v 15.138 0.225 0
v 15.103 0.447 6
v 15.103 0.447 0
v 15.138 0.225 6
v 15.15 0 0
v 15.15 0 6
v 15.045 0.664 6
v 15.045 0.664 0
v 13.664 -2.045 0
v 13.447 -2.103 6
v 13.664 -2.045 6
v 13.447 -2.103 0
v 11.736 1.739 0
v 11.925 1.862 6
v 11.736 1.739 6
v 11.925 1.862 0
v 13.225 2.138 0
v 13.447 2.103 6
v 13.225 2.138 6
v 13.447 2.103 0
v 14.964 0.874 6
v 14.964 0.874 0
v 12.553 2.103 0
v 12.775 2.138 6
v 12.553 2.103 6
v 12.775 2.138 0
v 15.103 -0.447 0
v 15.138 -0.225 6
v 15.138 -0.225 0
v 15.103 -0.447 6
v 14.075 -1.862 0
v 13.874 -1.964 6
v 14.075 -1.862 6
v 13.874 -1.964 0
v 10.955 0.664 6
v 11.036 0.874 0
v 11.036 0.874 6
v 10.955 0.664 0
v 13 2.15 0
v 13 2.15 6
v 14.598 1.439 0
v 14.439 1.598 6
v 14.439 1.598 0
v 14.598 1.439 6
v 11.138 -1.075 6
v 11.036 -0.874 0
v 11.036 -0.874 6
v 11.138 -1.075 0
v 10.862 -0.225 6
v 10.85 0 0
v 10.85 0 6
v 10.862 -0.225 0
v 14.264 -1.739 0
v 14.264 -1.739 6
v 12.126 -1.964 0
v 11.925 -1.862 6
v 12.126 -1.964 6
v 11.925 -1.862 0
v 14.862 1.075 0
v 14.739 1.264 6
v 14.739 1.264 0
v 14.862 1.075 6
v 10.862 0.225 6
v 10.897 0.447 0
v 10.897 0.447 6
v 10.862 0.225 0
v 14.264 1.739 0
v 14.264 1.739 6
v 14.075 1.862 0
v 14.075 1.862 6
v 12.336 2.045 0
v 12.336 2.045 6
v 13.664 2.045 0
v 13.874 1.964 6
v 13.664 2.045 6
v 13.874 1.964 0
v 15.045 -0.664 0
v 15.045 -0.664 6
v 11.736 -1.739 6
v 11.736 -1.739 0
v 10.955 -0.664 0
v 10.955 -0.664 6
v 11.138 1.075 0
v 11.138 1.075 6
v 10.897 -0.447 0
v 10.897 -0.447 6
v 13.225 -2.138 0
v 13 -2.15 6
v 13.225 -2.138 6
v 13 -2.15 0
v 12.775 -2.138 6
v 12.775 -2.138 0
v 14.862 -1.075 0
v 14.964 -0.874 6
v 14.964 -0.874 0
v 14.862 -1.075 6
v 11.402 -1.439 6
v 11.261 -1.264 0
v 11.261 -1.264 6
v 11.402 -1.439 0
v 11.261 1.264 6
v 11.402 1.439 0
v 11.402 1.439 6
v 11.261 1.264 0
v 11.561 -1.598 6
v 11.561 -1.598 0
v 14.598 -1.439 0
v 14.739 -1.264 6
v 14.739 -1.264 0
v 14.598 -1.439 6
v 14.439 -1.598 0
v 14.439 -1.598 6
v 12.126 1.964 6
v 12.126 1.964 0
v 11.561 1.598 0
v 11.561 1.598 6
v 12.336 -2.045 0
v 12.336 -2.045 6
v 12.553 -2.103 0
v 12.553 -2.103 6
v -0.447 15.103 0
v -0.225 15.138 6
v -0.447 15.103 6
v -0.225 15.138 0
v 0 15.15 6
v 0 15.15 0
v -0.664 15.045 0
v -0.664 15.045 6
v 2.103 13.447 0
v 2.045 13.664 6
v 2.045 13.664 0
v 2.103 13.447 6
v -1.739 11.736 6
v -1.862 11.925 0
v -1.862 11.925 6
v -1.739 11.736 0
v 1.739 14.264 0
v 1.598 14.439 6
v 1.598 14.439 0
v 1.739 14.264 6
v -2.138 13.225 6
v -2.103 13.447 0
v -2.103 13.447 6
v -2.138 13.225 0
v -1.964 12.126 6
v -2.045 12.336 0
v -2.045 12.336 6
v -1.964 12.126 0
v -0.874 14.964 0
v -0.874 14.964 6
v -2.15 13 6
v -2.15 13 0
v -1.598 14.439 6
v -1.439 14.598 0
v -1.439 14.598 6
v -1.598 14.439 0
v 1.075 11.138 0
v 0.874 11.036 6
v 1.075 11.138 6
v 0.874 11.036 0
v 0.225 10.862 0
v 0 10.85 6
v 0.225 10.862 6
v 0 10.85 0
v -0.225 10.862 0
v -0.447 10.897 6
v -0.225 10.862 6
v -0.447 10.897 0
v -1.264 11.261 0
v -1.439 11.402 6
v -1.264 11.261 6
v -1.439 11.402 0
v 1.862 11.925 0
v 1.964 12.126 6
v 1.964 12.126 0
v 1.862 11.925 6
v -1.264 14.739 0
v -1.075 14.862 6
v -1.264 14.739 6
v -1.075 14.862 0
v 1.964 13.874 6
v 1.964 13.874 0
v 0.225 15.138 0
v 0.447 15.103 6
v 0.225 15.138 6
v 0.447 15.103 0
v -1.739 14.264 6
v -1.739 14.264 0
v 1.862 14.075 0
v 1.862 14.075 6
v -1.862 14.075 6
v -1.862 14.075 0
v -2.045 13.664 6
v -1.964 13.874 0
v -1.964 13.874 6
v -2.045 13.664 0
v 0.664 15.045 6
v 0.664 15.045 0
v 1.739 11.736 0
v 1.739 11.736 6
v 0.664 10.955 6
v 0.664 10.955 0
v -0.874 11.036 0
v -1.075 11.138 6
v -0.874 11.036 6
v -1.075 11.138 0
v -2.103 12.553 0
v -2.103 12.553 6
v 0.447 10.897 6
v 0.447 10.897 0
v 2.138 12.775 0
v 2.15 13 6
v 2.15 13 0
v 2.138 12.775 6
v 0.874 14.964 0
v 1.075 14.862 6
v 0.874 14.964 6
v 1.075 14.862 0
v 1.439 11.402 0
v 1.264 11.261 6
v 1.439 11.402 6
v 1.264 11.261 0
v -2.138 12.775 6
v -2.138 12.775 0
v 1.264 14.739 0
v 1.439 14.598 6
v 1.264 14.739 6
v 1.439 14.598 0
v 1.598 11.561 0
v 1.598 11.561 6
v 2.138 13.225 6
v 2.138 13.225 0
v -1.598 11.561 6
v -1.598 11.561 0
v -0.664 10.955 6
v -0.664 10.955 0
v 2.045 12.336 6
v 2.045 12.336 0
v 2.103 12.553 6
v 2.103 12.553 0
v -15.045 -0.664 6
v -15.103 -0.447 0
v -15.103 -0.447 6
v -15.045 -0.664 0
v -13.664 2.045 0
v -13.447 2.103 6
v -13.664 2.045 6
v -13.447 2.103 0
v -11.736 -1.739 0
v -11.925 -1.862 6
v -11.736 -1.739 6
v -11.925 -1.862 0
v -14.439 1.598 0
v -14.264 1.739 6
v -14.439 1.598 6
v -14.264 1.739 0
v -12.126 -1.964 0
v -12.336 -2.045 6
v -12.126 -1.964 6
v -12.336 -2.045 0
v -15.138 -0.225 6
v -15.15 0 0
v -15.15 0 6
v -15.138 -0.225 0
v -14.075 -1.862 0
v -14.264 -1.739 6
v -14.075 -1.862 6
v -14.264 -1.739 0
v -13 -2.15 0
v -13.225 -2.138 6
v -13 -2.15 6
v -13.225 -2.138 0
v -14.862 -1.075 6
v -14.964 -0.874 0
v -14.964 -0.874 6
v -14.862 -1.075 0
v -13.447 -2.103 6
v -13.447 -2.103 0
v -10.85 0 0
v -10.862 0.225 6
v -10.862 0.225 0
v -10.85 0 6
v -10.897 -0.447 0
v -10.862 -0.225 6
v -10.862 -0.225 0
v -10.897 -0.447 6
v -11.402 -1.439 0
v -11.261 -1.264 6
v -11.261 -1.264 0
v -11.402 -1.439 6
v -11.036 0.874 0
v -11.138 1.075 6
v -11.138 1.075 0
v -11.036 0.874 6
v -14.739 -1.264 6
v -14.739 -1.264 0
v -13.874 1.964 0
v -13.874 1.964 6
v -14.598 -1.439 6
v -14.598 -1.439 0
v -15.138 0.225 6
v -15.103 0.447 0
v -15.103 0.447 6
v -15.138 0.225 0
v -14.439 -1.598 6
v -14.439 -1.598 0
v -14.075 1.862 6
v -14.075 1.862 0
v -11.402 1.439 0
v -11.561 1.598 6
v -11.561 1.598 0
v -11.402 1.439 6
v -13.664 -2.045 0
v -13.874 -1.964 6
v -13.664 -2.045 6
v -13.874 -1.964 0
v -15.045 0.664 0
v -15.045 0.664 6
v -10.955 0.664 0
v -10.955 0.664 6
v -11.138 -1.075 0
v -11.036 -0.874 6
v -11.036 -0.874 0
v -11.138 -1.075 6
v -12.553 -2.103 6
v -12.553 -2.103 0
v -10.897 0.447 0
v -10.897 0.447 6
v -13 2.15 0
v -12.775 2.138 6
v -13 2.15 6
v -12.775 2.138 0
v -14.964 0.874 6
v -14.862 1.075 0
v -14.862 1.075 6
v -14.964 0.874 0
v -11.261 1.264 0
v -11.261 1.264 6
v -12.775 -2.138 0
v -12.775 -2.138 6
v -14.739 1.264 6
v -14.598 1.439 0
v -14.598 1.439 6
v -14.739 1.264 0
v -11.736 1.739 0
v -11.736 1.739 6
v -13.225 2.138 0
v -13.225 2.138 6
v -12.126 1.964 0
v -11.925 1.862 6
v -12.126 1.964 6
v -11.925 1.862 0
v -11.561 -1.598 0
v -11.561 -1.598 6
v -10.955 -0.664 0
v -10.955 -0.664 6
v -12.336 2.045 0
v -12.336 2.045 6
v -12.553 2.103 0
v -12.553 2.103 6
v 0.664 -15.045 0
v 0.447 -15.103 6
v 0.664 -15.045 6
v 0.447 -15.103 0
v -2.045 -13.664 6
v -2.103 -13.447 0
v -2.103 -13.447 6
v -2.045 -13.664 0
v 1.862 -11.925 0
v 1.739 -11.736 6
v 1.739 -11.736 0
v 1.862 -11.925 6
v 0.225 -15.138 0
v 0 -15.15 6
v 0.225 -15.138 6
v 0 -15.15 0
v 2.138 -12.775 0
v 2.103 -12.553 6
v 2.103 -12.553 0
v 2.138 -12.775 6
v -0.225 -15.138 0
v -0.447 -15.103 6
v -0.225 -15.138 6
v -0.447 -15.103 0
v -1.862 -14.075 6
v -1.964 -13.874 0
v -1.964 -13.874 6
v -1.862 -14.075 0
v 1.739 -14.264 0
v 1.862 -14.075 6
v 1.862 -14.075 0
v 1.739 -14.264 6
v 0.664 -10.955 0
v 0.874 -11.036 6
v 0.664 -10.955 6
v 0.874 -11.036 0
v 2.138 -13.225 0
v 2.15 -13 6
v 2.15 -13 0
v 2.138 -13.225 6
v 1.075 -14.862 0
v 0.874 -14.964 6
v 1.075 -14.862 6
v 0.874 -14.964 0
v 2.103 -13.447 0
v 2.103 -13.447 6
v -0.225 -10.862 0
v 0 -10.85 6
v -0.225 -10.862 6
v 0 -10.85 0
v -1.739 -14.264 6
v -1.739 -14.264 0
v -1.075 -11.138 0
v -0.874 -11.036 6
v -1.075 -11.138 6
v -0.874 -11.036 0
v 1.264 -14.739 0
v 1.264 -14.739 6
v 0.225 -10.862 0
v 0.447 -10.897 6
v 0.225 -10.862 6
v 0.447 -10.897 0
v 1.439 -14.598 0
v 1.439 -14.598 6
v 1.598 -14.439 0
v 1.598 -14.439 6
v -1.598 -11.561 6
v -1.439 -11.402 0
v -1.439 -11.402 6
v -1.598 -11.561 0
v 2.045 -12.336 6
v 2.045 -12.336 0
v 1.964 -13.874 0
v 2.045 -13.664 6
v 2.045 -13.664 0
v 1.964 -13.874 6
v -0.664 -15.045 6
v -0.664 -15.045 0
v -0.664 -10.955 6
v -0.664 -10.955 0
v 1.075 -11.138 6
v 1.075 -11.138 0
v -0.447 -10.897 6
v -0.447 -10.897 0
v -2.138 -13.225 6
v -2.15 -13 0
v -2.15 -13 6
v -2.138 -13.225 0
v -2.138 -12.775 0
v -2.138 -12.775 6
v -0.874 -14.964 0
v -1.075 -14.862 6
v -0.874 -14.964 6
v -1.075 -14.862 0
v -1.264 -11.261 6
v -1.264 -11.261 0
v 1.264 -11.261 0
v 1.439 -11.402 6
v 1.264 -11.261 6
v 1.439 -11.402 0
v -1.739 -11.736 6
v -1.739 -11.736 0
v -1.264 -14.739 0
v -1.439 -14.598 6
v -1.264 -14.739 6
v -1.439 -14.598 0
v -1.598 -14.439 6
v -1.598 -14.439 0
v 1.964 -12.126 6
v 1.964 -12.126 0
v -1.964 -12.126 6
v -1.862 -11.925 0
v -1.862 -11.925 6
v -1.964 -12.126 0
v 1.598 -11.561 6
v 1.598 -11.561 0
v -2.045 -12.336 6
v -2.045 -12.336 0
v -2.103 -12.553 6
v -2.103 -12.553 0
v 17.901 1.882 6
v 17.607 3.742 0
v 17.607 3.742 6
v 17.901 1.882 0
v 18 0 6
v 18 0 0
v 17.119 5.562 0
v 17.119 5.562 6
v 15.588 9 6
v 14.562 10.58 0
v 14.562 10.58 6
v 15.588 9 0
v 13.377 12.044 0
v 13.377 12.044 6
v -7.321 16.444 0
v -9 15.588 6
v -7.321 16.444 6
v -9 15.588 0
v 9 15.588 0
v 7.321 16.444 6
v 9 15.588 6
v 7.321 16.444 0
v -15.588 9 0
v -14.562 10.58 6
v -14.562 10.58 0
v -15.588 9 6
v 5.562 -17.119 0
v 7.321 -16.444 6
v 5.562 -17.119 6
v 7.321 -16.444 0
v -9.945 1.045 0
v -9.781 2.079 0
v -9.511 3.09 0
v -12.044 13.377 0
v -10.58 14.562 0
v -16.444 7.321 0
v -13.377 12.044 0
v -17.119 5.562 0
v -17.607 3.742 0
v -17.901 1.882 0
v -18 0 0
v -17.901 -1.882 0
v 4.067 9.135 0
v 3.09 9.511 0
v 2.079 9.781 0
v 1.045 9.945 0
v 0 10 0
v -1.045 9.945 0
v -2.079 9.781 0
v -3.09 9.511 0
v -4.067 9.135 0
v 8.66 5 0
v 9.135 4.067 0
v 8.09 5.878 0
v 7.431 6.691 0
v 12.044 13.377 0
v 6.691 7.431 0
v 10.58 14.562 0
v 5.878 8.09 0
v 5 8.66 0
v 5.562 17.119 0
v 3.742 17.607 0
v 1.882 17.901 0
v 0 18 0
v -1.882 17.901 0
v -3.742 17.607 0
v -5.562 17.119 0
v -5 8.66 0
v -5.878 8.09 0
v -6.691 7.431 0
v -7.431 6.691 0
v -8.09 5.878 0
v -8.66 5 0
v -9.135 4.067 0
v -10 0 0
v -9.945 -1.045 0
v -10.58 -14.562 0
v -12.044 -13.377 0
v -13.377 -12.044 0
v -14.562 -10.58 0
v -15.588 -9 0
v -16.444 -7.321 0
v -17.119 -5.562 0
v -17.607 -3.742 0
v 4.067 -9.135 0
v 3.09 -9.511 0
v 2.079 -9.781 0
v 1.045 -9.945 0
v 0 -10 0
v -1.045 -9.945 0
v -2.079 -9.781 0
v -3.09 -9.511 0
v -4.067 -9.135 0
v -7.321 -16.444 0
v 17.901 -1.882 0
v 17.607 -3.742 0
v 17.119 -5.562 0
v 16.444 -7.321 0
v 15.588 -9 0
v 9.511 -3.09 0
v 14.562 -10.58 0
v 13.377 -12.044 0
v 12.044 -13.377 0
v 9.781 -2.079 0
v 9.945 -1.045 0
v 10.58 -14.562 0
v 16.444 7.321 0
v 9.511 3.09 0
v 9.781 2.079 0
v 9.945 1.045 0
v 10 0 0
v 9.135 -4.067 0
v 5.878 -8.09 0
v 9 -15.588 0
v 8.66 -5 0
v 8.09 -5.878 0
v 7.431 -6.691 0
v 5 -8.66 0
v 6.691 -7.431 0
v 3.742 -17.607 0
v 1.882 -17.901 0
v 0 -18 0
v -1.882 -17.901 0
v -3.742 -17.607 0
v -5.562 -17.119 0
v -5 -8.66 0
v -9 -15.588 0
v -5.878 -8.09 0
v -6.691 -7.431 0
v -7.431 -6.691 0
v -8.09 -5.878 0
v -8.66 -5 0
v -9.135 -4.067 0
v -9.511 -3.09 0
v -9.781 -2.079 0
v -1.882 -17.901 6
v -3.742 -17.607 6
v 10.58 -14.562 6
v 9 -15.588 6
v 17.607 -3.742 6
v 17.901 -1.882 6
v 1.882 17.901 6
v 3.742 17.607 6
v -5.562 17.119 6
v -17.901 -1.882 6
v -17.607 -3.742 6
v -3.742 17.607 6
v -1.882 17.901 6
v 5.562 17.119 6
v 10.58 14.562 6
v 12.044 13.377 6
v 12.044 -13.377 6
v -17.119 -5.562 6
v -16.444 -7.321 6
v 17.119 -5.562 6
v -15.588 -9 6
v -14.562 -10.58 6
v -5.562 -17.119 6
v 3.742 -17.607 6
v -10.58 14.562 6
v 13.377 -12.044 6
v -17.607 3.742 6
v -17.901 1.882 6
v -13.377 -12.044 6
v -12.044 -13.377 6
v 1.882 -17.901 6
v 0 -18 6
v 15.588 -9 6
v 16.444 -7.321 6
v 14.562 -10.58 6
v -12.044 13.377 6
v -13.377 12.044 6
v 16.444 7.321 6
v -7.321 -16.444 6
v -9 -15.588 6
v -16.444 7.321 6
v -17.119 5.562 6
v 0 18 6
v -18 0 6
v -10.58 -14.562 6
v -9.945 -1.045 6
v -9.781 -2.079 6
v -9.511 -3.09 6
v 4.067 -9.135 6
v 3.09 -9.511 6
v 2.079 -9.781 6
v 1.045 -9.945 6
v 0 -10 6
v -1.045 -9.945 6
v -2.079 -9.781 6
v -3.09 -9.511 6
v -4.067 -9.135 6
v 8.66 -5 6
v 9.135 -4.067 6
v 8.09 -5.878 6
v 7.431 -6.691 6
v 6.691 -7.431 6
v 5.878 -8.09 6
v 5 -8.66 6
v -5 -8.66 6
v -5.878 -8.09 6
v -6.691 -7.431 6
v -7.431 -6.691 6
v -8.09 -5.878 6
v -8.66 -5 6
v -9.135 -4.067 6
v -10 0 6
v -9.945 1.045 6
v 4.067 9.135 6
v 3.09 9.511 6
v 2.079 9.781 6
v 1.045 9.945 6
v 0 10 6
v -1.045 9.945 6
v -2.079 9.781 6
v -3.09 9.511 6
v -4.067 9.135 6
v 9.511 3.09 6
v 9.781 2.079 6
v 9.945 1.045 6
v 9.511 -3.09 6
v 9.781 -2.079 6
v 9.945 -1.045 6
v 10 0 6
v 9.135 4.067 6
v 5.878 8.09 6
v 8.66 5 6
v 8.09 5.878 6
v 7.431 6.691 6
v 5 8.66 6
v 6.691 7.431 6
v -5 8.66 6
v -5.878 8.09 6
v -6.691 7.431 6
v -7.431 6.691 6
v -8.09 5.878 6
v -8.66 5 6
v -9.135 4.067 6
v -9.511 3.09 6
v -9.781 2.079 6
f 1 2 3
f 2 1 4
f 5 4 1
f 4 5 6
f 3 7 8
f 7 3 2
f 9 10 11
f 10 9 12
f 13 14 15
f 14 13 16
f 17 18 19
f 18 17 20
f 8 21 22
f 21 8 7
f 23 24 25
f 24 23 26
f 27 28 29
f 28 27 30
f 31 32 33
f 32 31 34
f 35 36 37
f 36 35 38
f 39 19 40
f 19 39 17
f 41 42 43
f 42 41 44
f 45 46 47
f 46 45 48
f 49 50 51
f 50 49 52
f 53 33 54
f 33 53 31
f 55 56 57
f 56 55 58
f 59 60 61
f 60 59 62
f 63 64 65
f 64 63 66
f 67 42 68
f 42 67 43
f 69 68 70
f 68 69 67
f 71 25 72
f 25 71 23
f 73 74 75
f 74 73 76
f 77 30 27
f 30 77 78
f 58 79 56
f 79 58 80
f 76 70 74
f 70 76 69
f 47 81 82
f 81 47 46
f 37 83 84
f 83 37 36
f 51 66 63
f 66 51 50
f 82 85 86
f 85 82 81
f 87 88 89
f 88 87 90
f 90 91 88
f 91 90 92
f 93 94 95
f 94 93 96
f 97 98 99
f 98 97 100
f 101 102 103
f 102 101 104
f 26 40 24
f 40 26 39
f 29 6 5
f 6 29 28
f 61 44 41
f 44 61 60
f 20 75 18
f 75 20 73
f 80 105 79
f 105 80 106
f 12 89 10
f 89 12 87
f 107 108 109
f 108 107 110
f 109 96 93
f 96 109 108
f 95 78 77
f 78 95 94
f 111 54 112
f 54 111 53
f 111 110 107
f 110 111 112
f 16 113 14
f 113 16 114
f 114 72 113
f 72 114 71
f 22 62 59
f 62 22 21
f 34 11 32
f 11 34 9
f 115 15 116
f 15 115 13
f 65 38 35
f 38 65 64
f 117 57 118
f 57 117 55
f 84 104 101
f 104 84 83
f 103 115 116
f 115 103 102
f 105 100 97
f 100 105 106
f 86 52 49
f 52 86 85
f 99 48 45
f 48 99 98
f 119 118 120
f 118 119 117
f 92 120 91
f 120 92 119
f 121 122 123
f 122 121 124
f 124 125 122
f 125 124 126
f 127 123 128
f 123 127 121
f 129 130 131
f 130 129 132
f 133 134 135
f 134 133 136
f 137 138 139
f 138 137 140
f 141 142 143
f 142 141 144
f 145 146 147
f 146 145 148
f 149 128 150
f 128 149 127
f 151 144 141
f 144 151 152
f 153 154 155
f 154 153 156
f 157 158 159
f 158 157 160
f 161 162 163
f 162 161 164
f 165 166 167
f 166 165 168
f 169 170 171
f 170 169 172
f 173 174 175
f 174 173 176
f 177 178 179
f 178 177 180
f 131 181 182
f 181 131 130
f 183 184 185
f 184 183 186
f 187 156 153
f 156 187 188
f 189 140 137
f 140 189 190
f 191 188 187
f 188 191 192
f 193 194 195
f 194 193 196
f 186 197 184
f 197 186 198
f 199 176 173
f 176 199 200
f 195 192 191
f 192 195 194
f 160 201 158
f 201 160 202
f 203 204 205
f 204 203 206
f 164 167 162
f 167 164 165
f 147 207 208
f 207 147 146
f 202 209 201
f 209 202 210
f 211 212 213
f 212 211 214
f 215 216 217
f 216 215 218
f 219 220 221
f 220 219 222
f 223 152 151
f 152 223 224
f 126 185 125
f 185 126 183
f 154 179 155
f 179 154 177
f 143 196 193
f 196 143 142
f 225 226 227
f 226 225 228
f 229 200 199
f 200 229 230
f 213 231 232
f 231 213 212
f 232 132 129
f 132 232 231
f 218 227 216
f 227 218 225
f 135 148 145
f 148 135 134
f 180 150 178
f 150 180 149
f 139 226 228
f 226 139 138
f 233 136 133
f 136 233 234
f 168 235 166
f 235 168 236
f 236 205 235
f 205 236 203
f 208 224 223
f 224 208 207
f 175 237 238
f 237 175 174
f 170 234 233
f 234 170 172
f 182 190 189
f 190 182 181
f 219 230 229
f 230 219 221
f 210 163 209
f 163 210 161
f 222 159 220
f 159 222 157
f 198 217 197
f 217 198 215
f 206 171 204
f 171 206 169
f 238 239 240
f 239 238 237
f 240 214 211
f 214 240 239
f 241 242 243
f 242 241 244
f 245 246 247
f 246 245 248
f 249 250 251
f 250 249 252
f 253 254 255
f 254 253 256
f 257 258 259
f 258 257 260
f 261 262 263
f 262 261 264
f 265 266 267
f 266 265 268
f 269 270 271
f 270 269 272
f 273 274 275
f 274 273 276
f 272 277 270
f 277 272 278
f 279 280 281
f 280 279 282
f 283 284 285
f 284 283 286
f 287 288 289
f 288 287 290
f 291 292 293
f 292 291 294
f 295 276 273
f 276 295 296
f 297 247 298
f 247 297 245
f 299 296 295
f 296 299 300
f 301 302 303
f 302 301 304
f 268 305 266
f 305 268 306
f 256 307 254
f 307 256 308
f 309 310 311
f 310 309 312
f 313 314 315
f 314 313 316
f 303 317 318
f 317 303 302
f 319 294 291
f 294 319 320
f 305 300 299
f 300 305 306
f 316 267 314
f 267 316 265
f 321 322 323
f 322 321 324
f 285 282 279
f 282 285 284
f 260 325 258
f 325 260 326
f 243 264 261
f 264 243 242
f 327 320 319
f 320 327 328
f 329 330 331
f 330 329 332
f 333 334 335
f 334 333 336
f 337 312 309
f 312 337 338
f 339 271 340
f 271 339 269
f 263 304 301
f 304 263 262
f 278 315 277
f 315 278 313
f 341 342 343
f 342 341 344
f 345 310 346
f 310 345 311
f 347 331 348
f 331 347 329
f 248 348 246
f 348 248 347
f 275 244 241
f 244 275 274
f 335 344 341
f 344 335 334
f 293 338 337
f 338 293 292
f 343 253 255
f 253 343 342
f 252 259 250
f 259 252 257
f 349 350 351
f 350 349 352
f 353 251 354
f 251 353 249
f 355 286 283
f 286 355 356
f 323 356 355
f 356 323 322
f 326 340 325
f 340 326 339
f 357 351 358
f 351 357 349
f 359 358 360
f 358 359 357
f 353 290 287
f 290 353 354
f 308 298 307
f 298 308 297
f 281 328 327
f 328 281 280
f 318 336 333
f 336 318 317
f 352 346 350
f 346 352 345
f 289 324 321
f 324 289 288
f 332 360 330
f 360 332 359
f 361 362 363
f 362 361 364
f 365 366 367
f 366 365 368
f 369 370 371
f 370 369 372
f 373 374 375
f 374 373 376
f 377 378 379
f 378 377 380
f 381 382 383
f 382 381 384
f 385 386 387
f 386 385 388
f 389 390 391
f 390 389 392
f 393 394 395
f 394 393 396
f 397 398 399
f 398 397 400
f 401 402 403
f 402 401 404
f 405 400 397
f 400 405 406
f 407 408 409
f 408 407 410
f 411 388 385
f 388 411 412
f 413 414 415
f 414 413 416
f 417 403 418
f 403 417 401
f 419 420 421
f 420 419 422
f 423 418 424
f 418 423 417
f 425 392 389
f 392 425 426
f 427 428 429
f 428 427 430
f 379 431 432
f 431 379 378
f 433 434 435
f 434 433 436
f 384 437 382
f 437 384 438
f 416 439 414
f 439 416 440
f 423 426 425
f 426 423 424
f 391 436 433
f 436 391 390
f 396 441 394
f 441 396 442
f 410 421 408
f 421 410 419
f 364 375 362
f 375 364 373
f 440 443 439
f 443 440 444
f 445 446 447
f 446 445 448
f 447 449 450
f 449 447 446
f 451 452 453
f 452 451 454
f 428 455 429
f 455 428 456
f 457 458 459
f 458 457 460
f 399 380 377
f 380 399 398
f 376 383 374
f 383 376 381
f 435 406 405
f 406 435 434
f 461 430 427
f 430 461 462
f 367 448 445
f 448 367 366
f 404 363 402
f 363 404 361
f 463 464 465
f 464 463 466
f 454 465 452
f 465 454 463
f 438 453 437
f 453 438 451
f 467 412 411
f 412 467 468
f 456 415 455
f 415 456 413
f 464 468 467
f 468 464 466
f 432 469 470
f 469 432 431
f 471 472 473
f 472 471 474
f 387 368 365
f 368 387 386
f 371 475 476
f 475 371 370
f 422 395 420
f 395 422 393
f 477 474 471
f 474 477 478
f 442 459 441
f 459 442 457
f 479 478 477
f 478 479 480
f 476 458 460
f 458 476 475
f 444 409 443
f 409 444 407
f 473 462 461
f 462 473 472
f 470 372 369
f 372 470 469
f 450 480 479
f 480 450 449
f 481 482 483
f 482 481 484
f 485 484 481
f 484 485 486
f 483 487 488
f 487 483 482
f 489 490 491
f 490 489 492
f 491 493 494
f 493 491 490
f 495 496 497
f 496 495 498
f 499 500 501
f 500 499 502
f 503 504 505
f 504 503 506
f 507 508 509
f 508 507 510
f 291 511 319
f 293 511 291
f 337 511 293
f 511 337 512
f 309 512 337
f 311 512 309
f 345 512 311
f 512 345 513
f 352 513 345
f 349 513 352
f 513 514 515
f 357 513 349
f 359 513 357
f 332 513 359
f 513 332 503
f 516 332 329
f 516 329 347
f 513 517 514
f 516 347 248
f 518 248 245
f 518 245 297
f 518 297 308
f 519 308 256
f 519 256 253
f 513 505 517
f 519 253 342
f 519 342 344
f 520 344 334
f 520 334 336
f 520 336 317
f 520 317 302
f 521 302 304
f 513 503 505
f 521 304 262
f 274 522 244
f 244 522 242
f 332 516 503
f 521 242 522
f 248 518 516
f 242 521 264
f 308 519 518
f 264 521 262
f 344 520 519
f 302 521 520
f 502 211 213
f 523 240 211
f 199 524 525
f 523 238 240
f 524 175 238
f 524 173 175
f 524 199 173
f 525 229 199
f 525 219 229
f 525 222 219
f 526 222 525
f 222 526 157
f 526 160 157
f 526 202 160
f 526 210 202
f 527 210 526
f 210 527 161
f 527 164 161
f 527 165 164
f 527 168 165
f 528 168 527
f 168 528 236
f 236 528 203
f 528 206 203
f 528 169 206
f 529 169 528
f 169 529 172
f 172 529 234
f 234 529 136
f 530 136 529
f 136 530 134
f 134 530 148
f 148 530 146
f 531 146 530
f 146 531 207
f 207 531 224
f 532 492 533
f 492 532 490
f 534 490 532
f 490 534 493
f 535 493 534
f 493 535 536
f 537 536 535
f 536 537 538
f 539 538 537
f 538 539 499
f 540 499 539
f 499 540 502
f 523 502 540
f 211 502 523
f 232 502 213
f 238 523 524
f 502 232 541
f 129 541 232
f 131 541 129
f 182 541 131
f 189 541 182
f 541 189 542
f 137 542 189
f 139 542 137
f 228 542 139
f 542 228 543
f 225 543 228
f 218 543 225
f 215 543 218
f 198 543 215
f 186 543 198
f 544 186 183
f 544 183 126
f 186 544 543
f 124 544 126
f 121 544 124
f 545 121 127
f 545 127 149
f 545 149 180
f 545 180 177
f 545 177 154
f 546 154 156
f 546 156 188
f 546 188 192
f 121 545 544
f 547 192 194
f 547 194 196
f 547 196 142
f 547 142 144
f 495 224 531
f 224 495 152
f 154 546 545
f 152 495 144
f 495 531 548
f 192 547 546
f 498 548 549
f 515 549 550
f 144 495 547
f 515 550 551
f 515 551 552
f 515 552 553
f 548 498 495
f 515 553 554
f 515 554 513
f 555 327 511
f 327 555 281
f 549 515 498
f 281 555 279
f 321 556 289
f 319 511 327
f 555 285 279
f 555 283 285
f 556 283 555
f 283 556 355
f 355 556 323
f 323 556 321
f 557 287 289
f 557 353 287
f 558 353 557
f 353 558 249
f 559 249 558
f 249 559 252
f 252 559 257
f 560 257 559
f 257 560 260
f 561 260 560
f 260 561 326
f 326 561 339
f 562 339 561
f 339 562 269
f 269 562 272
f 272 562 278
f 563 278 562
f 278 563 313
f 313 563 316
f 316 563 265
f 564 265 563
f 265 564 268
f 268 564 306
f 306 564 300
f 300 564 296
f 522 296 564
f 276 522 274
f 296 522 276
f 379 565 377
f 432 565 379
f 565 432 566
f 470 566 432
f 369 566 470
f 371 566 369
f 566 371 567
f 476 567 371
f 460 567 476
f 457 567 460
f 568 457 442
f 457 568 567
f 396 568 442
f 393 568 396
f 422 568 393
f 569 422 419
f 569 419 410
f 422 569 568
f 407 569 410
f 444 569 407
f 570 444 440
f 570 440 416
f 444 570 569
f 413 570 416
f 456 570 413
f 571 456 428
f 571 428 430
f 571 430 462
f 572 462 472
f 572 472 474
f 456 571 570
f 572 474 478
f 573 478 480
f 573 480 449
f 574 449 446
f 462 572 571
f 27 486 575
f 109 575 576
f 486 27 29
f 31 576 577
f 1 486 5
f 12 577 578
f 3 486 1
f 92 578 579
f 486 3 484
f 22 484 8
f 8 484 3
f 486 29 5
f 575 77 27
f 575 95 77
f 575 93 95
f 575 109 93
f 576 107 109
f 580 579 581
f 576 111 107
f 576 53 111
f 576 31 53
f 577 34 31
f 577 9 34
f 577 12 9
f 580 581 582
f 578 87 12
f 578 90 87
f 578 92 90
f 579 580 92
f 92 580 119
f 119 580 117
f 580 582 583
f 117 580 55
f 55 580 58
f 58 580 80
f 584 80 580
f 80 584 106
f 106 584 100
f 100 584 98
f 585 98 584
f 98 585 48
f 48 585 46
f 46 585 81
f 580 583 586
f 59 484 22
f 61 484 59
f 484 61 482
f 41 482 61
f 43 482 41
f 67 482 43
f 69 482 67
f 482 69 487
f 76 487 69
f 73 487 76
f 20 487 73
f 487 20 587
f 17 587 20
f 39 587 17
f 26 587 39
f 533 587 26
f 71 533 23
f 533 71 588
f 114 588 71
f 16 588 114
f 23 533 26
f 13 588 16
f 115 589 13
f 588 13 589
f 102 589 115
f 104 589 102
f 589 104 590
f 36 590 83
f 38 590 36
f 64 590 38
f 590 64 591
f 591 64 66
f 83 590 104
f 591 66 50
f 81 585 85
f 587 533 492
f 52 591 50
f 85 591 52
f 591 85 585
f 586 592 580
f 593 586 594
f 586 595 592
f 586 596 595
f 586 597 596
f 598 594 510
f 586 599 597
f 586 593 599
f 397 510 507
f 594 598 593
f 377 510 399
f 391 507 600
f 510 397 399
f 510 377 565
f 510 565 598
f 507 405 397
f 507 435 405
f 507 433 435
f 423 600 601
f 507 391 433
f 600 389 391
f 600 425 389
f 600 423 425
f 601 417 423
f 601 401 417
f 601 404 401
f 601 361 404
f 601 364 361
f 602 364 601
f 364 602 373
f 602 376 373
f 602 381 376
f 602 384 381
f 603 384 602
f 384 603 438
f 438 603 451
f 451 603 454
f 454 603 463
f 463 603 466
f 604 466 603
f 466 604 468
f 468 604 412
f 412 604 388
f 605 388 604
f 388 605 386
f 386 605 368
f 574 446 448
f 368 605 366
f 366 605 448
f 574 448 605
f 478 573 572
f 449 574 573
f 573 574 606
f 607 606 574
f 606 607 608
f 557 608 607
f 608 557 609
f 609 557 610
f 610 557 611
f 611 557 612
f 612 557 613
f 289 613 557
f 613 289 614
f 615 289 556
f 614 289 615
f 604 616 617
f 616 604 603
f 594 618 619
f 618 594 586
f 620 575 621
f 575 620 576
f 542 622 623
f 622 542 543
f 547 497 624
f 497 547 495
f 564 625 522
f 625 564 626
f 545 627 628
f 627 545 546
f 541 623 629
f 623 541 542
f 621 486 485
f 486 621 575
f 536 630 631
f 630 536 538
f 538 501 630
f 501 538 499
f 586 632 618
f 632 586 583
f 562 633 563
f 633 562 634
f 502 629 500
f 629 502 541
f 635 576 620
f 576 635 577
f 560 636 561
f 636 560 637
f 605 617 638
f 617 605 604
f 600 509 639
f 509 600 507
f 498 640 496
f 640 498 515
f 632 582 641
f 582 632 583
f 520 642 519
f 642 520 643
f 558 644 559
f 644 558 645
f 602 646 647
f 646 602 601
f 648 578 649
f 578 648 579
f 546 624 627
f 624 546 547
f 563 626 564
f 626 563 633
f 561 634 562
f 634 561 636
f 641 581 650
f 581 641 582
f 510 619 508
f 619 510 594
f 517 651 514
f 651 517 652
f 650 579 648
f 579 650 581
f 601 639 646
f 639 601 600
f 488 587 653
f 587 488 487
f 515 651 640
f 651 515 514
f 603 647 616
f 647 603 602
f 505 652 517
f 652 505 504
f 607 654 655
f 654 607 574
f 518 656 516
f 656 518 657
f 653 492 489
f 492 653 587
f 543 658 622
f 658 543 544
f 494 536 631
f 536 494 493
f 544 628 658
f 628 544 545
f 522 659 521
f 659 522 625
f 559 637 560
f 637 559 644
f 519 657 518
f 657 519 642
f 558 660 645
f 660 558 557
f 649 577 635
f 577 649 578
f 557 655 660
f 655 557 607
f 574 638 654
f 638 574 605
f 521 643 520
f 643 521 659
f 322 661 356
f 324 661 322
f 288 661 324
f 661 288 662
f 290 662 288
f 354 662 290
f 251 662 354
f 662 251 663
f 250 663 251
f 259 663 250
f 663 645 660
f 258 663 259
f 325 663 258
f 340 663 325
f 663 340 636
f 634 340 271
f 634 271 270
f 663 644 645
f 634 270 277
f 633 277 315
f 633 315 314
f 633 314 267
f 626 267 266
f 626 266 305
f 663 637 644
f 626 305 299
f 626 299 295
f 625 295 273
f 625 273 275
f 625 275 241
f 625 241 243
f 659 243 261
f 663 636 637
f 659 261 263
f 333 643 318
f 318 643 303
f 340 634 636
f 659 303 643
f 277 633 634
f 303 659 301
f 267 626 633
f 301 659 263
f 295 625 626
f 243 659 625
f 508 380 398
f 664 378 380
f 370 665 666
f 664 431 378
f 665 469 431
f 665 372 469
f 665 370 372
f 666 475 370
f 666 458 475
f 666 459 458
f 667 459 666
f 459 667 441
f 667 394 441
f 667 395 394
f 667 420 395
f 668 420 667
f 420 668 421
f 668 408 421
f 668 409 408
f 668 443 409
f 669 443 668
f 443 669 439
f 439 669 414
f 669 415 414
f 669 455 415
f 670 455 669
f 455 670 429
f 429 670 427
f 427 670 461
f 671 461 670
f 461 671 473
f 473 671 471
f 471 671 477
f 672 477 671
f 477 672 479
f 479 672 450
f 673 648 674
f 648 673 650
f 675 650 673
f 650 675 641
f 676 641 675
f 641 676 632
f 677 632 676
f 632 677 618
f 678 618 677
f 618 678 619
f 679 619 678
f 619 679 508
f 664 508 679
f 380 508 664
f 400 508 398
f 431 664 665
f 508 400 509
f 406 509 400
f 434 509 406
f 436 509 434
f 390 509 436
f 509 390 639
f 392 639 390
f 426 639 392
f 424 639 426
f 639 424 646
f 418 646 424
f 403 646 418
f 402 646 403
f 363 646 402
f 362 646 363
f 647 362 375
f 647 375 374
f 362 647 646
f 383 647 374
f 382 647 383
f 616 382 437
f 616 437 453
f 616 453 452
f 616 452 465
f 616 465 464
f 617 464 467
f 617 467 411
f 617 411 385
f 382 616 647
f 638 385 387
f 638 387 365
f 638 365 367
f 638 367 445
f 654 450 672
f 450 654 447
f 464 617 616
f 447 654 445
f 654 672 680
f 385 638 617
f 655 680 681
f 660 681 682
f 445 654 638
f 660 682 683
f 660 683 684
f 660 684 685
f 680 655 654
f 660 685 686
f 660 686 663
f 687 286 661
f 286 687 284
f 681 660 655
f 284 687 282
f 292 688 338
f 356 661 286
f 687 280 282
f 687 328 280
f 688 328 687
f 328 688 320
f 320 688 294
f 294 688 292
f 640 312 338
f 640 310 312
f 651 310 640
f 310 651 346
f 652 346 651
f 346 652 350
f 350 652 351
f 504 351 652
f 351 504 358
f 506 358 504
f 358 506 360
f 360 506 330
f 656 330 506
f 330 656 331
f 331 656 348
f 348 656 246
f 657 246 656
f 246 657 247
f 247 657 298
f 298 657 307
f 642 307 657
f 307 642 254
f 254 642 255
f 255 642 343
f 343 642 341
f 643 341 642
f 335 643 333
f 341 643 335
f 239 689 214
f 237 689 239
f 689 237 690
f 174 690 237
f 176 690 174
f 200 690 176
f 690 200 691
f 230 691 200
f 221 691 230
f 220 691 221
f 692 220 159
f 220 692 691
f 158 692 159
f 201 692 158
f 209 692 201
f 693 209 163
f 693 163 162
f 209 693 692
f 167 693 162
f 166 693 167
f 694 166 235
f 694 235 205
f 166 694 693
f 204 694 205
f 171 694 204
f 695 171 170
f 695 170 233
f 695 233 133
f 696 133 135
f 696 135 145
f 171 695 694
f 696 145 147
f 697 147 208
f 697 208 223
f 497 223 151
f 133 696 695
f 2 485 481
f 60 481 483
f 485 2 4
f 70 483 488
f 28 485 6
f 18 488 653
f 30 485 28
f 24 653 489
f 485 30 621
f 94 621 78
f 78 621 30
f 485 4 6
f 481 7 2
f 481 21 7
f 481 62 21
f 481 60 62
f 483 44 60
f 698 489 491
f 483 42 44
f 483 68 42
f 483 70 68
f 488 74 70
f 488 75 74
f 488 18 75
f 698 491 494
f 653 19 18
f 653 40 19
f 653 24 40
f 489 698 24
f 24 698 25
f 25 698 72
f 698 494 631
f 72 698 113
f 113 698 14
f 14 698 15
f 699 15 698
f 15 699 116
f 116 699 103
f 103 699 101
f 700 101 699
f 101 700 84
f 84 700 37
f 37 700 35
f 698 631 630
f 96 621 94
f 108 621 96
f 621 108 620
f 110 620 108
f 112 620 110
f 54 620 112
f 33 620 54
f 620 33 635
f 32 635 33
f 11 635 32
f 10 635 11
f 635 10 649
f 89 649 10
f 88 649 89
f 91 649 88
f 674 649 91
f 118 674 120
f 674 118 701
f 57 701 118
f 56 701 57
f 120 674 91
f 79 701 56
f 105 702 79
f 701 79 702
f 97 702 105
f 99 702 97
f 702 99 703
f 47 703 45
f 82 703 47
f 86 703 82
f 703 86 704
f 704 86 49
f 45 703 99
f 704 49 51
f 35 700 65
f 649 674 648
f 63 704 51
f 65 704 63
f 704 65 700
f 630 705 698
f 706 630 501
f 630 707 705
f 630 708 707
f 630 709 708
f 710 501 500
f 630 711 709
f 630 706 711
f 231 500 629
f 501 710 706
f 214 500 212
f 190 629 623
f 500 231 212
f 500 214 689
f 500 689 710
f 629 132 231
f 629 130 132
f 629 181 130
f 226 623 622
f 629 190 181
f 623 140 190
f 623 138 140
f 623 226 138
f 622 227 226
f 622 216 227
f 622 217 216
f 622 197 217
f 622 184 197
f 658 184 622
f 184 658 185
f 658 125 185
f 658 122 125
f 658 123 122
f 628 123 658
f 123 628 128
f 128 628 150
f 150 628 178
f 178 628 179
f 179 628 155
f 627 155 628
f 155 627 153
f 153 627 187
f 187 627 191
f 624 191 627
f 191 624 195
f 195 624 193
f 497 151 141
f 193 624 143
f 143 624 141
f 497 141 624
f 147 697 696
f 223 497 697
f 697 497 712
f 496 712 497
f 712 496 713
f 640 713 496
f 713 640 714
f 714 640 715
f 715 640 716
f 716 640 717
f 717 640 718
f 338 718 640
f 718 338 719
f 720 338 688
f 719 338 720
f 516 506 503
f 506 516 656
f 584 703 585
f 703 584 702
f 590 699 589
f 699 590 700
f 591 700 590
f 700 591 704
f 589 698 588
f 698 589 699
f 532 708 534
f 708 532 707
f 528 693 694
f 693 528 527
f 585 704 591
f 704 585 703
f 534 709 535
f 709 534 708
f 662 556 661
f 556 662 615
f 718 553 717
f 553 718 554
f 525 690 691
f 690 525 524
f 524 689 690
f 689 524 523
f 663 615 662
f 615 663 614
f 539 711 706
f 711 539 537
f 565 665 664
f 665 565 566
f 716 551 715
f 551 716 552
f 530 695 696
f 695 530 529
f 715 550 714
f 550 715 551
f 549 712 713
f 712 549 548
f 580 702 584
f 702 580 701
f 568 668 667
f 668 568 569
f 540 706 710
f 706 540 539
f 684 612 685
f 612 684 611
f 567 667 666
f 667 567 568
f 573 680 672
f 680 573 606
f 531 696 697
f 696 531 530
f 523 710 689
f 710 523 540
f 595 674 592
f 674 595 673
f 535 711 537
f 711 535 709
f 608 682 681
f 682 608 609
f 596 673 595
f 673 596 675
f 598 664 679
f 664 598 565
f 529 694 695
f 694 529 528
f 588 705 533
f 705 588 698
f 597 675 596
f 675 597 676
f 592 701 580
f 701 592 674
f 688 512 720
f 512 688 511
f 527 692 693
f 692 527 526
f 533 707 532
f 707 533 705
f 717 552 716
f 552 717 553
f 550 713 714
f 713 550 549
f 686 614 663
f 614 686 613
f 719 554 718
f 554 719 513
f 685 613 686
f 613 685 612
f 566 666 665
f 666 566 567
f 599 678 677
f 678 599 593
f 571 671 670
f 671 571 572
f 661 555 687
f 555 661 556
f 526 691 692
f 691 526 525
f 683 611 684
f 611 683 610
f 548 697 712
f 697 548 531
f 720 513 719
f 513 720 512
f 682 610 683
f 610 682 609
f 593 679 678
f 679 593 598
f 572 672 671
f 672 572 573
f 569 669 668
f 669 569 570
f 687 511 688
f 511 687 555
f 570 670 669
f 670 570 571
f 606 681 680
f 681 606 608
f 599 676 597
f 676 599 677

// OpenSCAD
// Shaft-seal holder plate.
$fn = 60;
eps = 0.02;
seal_d = 20;
outer_d = 36;
plate_t = 6;
difference() { cylinder(d=outer_d,h=plate_t); translate([0,0,-eps]) cylinder(d=seal_d,h=plate_t+2*eps); for(i=[0:3]) rotate([0,0,i*90]) translate([outer_d/2-5,0,-eps]) cylinder(d=4.3,h=plate_t+2*eps); }
